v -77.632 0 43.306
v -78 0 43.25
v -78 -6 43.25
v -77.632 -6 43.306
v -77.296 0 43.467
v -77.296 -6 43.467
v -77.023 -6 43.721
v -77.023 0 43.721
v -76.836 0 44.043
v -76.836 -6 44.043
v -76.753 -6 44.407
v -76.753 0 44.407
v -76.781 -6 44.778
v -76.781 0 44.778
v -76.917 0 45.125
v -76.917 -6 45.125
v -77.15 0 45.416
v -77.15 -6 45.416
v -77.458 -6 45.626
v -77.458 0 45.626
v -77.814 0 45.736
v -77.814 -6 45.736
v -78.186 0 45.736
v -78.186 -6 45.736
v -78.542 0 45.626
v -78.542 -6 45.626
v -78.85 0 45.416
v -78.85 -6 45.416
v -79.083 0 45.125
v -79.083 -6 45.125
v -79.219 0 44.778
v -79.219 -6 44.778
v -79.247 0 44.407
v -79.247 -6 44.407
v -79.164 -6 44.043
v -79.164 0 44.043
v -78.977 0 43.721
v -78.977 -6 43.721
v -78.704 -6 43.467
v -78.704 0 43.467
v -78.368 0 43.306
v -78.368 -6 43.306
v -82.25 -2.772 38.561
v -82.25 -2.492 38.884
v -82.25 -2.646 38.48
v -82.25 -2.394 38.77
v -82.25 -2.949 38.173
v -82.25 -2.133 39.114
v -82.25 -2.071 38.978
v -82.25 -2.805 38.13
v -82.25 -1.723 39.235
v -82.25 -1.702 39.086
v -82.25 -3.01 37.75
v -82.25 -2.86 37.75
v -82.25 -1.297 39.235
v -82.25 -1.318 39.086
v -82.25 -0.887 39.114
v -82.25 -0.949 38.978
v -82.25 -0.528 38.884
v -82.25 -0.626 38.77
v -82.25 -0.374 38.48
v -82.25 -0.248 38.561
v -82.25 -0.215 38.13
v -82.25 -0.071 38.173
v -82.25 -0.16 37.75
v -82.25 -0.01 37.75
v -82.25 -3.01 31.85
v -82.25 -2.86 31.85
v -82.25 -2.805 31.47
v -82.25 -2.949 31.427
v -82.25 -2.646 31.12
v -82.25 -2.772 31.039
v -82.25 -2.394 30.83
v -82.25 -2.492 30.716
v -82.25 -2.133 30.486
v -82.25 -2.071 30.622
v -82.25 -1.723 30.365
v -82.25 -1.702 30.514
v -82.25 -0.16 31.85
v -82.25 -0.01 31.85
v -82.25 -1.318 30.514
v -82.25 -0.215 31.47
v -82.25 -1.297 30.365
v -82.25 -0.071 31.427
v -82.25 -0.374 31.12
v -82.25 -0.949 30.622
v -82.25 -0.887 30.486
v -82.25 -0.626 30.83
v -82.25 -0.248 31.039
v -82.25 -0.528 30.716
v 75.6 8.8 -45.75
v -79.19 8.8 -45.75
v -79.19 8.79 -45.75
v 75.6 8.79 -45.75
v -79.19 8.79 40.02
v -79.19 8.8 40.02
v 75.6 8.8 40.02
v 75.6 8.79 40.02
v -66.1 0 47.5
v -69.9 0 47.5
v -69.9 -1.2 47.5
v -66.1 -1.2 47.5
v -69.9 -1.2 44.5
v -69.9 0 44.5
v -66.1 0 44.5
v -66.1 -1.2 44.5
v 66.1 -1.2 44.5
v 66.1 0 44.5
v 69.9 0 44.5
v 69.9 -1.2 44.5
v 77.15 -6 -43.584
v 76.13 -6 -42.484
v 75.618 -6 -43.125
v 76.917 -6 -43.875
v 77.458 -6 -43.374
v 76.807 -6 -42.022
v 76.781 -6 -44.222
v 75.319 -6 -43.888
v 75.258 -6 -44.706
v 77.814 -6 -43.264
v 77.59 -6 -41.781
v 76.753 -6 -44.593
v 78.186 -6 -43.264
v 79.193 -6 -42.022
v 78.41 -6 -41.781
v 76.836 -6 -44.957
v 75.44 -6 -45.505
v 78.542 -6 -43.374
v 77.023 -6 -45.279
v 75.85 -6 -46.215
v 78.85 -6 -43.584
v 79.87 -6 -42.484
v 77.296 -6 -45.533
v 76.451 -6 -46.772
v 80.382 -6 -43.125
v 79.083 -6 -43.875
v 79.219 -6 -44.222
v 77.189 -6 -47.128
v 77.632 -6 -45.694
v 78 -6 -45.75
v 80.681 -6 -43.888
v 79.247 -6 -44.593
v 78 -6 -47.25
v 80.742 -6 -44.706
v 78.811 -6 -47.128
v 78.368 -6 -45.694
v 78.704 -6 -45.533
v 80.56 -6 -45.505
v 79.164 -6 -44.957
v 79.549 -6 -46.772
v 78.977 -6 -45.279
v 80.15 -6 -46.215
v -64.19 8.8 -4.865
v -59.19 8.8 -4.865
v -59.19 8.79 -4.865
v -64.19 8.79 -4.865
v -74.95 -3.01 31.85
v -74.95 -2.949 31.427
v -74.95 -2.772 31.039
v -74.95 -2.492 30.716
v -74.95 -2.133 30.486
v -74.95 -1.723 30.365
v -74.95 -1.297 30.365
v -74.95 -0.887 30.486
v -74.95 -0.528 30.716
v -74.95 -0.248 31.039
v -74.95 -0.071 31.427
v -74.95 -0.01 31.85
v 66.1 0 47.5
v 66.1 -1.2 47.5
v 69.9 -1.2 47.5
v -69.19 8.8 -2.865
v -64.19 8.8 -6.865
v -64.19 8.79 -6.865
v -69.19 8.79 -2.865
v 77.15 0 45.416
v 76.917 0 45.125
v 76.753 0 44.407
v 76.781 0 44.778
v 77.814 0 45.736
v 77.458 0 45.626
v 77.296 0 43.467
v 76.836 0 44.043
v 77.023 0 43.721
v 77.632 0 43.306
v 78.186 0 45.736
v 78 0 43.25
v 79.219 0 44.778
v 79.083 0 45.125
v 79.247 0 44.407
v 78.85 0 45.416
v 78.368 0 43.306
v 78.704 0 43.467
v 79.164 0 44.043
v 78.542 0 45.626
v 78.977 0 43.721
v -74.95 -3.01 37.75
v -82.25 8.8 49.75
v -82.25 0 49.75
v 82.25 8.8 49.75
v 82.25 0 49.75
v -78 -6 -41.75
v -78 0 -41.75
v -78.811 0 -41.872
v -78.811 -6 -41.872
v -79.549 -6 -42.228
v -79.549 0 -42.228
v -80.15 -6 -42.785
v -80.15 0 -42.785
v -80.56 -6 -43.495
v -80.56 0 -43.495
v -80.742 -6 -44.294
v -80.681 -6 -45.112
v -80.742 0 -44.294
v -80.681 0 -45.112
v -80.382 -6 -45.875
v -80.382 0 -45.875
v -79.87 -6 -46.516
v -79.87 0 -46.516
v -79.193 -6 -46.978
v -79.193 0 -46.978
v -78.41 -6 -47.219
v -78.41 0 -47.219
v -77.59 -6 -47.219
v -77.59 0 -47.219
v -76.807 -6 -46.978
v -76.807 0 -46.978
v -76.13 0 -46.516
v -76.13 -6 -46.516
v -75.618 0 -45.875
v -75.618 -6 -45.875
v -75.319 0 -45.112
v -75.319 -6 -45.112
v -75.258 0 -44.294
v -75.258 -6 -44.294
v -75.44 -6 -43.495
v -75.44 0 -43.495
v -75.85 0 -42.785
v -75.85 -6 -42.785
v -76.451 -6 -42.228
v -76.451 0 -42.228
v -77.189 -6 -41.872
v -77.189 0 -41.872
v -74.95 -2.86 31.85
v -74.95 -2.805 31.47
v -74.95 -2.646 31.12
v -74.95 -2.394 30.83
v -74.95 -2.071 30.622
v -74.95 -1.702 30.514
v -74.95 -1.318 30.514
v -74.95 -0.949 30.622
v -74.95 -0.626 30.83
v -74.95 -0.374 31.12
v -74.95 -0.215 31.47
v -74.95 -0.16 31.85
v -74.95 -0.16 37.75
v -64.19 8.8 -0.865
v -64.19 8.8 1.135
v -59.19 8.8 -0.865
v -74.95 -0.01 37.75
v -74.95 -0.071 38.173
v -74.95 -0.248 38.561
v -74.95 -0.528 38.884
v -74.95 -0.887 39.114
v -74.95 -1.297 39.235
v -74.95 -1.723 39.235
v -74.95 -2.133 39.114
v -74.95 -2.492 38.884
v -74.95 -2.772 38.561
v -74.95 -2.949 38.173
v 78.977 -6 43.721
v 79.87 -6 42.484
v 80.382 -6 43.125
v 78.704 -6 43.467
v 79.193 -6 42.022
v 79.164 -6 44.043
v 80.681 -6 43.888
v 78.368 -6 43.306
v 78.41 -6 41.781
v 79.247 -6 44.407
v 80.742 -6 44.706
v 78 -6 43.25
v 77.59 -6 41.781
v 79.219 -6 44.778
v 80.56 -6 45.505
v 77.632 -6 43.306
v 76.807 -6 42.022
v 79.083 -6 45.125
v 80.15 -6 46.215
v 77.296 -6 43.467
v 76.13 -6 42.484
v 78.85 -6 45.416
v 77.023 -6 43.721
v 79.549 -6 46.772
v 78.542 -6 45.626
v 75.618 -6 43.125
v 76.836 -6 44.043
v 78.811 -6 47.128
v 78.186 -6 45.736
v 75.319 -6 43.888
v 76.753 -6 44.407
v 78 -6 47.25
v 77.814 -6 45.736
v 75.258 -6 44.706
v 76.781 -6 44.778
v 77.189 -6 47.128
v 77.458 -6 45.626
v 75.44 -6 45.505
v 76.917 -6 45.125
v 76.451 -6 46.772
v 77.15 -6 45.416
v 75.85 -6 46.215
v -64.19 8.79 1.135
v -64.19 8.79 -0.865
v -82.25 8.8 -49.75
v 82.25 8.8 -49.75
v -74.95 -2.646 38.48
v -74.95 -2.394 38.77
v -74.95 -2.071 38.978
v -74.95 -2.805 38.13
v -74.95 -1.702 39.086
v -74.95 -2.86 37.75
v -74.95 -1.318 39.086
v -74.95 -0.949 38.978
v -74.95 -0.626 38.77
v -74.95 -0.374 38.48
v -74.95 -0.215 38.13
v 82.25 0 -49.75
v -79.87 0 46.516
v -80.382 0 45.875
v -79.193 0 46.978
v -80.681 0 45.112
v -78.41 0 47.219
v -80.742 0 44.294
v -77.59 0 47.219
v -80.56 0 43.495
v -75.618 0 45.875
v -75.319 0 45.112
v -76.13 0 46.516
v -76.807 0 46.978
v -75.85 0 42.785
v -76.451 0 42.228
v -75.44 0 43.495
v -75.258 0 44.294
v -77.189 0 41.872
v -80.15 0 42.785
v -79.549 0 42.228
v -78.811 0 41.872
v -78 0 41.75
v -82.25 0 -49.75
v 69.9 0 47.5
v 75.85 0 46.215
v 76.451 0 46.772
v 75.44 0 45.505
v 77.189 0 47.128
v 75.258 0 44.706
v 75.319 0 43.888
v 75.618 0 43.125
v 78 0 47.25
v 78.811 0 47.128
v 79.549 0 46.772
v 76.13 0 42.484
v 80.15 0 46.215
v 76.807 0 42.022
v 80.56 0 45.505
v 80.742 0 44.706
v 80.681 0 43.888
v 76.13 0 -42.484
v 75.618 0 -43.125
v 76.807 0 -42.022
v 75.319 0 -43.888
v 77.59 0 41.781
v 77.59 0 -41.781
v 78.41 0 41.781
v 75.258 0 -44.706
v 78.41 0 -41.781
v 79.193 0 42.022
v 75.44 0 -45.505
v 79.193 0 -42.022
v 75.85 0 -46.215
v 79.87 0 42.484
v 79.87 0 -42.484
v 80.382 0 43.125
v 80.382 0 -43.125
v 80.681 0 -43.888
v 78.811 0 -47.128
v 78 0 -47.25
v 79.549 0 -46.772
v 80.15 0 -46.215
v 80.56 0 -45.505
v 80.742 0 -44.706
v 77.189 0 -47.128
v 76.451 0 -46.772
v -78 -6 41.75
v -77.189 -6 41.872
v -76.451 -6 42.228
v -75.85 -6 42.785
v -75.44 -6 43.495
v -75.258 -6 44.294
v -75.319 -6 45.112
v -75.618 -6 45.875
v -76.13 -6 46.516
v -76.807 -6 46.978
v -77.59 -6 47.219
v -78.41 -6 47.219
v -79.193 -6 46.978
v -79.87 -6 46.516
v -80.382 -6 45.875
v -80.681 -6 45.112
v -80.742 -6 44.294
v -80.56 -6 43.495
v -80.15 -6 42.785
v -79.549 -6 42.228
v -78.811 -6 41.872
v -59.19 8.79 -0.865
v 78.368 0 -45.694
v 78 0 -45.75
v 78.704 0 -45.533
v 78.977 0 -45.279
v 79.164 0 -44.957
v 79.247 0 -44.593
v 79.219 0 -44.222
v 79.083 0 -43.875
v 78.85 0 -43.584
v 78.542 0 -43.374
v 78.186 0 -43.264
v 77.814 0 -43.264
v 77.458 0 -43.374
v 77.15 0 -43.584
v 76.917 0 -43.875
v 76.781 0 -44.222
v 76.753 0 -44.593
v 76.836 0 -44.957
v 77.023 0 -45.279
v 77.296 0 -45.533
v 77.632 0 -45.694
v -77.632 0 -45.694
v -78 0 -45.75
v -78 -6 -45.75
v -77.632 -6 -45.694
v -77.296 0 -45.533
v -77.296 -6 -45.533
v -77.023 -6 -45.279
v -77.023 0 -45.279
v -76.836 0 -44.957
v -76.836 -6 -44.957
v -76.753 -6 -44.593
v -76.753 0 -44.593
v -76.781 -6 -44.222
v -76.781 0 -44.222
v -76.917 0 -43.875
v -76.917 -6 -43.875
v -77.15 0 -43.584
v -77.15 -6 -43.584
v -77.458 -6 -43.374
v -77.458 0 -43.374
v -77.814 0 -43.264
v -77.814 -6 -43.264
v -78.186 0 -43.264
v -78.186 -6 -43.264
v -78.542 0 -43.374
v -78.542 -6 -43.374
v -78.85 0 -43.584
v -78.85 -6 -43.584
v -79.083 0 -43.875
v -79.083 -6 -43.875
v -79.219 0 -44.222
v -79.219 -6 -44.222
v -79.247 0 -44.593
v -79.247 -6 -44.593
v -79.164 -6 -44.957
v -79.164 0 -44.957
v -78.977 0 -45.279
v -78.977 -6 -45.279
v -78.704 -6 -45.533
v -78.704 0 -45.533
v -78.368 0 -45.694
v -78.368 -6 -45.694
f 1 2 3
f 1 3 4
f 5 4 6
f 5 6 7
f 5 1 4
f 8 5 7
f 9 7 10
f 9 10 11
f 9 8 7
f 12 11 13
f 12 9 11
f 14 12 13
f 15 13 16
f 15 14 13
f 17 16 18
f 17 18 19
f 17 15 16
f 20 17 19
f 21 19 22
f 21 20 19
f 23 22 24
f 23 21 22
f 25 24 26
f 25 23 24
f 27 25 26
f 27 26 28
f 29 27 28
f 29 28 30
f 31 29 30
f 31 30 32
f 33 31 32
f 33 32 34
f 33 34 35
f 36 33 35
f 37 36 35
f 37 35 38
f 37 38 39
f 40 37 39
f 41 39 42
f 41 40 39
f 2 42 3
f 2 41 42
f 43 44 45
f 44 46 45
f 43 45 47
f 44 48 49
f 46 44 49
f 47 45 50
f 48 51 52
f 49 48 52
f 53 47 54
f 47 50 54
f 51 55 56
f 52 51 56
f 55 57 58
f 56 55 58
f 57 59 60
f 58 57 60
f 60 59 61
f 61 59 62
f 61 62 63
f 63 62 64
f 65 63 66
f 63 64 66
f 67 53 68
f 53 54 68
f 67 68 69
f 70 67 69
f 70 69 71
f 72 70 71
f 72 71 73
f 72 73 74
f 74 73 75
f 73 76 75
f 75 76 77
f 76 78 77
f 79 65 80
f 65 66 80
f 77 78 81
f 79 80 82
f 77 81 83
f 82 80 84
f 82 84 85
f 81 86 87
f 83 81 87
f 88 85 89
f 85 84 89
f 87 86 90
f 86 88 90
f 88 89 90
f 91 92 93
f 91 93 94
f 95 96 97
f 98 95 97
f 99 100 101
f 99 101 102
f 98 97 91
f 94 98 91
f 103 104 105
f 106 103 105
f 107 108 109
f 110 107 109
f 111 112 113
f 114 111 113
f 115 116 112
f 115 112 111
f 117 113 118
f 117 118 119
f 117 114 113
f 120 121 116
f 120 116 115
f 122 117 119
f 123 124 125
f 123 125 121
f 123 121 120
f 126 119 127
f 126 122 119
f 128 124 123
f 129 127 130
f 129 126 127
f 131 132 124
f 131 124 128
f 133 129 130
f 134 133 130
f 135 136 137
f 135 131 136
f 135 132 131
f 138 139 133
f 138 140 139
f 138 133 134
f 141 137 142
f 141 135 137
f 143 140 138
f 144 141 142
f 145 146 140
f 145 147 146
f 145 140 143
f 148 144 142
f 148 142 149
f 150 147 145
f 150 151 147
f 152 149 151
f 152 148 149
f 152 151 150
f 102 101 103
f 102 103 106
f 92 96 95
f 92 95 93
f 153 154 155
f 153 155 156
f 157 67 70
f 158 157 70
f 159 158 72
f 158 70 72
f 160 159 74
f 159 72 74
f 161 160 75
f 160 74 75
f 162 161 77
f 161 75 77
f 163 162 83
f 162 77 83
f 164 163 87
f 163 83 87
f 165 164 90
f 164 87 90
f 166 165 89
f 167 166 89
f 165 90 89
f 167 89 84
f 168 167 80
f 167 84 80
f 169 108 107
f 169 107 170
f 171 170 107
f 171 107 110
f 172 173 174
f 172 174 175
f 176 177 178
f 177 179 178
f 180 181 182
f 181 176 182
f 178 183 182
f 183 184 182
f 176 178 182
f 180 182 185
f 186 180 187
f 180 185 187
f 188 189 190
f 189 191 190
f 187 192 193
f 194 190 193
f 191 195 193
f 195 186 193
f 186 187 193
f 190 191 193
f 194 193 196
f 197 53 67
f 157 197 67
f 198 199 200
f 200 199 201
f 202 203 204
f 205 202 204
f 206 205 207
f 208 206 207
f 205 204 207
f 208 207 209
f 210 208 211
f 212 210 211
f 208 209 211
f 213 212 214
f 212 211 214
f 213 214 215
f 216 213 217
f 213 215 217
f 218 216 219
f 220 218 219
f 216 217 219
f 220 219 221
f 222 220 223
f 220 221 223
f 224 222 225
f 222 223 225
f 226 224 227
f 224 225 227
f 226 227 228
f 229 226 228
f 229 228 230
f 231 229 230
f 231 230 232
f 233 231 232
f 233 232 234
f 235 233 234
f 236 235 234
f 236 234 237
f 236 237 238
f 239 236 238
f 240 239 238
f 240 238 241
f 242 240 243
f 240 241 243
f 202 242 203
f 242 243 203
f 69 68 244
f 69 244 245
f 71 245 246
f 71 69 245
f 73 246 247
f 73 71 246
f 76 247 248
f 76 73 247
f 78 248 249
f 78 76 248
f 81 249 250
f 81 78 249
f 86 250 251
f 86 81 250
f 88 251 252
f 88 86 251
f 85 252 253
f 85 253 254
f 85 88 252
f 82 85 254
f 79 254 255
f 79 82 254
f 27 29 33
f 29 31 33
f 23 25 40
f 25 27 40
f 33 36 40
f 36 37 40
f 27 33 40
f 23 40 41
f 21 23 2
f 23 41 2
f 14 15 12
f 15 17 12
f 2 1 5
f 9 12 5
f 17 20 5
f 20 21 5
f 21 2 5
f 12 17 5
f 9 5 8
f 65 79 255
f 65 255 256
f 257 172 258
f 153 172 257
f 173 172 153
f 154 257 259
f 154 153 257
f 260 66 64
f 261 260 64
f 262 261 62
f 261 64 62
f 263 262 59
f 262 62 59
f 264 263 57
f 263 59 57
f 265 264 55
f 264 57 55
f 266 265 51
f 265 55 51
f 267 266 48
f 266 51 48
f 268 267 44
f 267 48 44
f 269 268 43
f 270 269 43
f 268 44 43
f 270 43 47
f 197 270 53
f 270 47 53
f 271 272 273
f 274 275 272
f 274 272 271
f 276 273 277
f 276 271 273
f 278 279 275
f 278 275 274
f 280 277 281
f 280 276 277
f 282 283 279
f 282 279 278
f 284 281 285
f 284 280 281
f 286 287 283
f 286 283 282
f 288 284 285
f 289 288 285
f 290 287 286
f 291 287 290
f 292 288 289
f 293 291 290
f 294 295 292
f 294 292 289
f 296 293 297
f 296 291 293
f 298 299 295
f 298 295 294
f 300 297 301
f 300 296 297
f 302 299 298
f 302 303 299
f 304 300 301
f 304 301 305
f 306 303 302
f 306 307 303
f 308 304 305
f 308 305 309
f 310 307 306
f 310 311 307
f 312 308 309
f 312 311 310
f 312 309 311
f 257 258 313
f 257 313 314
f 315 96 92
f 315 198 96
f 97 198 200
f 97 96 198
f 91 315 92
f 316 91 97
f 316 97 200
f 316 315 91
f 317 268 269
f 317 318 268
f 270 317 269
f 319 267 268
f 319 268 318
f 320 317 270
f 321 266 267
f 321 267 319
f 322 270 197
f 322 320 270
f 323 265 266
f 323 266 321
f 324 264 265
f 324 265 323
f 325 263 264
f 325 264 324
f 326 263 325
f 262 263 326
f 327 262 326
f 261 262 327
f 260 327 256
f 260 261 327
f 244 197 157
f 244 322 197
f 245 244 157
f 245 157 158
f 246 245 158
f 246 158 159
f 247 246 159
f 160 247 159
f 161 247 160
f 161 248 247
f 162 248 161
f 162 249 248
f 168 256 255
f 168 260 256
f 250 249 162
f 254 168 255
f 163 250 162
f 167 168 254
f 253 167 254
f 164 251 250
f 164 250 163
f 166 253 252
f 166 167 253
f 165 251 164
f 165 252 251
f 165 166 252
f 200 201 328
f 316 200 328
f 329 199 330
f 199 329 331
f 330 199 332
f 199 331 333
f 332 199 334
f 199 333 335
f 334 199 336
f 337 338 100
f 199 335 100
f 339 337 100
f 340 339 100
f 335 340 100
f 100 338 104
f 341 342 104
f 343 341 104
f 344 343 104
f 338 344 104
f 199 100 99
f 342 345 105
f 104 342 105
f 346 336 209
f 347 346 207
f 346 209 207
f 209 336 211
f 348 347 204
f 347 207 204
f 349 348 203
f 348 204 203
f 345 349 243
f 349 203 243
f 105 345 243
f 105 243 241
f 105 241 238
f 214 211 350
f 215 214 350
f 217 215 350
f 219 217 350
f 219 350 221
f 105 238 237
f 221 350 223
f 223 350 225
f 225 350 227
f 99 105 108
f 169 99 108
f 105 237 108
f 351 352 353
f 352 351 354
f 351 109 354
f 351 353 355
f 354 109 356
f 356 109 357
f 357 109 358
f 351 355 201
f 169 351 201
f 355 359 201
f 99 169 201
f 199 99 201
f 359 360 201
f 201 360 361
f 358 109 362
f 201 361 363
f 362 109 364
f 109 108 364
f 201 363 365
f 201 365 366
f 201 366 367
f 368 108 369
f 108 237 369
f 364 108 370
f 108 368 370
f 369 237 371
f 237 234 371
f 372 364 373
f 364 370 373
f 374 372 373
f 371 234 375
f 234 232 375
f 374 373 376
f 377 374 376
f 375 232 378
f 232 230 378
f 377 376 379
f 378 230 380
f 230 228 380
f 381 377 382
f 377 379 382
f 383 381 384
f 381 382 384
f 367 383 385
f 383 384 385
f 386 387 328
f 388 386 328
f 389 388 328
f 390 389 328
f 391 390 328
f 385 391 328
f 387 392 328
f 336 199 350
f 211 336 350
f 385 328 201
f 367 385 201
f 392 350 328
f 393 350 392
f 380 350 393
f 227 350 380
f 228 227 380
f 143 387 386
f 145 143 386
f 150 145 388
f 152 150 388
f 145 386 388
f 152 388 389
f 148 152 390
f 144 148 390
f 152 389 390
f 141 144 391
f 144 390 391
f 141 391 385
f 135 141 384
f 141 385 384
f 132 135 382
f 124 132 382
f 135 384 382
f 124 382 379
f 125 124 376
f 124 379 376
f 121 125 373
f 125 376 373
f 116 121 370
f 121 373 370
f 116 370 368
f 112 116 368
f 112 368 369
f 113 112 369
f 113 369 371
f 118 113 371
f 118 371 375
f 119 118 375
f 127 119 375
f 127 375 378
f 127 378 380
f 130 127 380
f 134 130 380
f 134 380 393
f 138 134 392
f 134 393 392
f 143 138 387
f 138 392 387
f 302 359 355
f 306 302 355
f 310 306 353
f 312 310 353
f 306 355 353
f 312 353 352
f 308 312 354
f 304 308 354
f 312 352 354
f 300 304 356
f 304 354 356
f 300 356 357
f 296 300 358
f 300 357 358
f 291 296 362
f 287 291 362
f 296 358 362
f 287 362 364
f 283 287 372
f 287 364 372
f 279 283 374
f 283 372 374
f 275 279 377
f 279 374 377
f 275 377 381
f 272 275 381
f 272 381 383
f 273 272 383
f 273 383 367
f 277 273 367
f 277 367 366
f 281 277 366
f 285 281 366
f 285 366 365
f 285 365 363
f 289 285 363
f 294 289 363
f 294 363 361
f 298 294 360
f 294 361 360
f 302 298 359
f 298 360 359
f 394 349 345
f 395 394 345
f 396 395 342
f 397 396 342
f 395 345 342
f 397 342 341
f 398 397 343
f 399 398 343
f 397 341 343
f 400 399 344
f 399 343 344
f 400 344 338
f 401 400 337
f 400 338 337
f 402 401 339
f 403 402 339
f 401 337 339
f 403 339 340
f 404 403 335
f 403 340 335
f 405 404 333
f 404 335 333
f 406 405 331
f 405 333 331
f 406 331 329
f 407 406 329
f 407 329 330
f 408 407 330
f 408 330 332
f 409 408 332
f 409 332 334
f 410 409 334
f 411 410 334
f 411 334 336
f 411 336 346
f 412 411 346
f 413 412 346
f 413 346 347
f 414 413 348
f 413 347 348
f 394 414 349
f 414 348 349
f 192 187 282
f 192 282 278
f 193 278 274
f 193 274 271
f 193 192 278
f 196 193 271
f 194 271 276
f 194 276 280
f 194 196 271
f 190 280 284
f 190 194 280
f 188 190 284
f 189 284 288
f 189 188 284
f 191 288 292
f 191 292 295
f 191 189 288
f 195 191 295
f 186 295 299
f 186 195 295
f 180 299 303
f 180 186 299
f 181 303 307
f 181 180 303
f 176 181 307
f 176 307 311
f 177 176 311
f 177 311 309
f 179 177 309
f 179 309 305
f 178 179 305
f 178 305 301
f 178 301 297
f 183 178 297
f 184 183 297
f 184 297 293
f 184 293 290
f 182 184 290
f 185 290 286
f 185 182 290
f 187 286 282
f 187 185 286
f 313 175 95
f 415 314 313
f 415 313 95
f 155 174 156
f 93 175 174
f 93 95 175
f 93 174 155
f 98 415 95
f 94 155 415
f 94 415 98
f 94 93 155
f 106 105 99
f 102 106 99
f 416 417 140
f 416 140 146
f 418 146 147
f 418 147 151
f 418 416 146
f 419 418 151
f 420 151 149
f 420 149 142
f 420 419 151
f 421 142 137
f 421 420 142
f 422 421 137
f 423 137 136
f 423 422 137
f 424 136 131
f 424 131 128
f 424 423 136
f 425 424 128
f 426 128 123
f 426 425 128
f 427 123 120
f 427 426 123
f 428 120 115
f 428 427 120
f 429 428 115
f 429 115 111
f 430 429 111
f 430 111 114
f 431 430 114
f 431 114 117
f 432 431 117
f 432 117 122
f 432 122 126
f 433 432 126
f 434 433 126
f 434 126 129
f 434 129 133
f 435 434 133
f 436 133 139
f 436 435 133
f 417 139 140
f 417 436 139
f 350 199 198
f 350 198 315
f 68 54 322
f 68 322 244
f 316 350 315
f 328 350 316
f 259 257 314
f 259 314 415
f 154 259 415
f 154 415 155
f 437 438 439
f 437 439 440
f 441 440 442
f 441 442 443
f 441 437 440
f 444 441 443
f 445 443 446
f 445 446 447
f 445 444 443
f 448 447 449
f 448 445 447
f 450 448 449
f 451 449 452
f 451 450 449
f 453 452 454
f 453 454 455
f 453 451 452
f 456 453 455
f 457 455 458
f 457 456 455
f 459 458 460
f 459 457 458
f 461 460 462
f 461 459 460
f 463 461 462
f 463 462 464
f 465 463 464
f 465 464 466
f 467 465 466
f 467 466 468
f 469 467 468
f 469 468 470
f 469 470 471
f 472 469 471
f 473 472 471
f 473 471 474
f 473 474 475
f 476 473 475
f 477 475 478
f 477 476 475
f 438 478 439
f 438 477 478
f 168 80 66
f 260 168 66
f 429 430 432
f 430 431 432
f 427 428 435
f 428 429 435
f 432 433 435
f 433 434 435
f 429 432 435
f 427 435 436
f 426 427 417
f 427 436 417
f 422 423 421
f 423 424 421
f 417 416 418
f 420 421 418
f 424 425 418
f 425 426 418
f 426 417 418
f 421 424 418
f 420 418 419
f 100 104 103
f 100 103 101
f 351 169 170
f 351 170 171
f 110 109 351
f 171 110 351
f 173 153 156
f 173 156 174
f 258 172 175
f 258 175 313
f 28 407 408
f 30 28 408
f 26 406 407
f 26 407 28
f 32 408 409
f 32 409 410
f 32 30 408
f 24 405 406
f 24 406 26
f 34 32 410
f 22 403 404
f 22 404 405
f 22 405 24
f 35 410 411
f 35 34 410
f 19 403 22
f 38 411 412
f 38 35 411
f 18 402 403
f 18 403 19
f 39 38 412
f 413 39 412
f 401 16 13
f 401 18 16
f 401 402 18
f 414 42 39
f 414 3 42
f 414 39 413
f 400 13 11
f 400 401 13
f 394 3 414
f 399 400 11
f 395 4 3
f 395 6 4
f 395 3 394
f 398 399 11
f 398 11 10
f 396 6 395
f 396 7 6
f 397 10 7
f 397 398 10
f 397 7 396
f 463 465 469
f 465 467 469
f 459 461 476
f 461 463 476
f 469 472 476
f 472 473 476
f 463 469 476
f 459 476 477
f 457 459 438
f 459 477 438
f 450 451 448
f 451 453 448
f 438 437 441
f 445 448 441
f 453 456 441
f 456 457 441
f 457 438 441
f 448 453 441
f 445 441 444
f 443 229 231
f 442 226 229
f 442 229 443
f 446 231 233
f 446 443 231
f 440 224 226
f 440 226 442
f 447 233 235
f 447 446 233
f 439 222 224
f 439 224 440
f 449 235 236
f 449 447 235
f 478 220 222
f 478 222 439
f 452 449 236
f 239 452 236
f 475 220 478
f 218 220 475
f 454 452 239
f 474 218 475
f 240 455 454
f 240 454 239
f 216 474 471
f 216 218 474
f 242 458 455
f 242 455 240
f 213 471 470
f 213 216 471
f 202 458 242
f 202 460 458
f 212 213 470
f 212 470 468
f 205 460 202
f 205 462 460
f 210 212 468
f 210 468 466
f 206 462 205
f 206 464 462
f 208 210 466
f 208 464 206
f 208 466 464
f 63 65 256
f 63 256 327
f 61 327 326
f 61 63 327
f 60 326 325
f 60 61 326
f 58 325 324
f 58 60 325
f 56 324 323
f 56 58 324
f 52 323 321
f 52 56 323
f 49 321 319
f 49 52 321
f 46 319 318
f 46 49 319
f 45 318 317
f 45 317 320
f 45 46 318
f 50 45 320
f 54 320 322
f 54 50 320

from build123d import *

# Parameters (mm, degrees)
SKETCH1_W           = 164.5
SKETCH1_H           = 99.5
BOSS_EXTRUDE1_DEPTH = 8.8
SKETCH2_R           = 2.75
SKETCH2_R_2         = 1.25
BOSS_EXTRUDE2_DEPTH = 6
SKETCH3_W           = 154.79
SKETCH3_H           = 85.77
CUT_EXTRUDE1_DEPTH  = 0.01
BOSS_EXTRUDE3_DEPTH = 7.3
SKETCH5_W           = 3.8
SKETCH5_H           = 3
BOSS_EXTRUDE4_DEPTH = 1.2


with BuildPart() as part:
    # Sketch1 → Boss-Extrude1 (new body)
    with BuildSketch(Plane(origin=(0, 0, 0), x_dir=(1, 0, 0), z_dir=(0, 1, 0))):
        Rectangle(SKETCH1_W, SKETCH1_H)
    extrude(amount=BOSS_EXTRUDE1_DEPTH)

    # Sketch2 → Boss-Extrude2 (add)
    # profile 1 of 4: a face of its own
    with BuildSketch(Plane.XZ):
        with Locations(Location((-78, 44.5, 0), (0, 0, 270))):
            Circle(SKETCH2_R)
        with Locations(Location((-78, 44.5, 0), (0, 0, 270))):
            Circle(SKETCH2_R_2, mode=Mode.SUBTRACT)
    # profile 2 of 4: a face of its own
    with BuildSketch(Plane.XZ):
        with Locations(Location((78, 44.5, 0), (0, 0, 90))):
            Circle(SKETCH2_R)
        with Locations(Location((78, 44.5, 0), (0, 0, 270))):
            Circle(SKETCH2_R_2, mode=Mode.SUBTRACT)
    # profile 3 of 4: a face of its own
    with BuildSketch(Plane.XZ):
        with Locations(Location((78, -44.5, 0), (0, 0, 270))):
            Circle(SKETCH2_R)
        with Locations(Location((78, -44.5, 0), (0, 0, 270))):
            Circle(SKETCH2_R_2, mode=Mode.SUBTRACT)
    # profile 4 of 4: a face of its own
    with BuildSketch(Plane.XZ):
        with Locations(Location((-78, -44.5, 0), (0, 0, 90))):
            Circle(SKETCH2_R)
        with Locations(Location((-78, -44.5, 0), (0, 0, 270))):
            Circle(SKETCH2_R_2, mode=Mode.SUBTRACT)
    extrude(amount=BOSS_EXTRUDE2_DEPTH)

    # Sketch3 → Cut-Extrude1 (cut)
    with BuildSketch(Plane(origin=(0, 8.8, 0), x_dir=(1, 0, 0), z_dir=(0, 1, 0))):
        with Locations((-1.795, 2.865)):
            Rectangle(SKETCH3_W, SKETCH3_H)
        Polygon((-64.19, -1.135), (-64.19, 0.865), (-59.19, 0.865), (-59.19, 4.865), (-64.19, 4.865), (-64.19, 6.865), (-69.19, 2.865), align=None, mode=Mode.SUBTRACT)
    extrude(amount=-CUT_EXTRUDE1_DEPTH, mode=Mode.SUBTRACT)

    # Sketch5 → Boss-Extrude4 (add)
    with BuildSketch(Plane.XZ):
        with Locations((-68, 46)):
            Rectangle(SKETCH5_W, SKETCH5_H)
        with Locations((68, 46)):
            Rectangle(SKETCH5_W, SKETCH5_H)
    extrude(amount=BOSS_EXTRUDE4_DEPTH)


with BuildPart() as body_2:
    # Sketch4 → Boss-Extrude3 (new body)
    with BuildSketch(Plane.ZY.offset(82.25)):
        with BuildLine():
            Line((31.85, -0.01), (37.75, -0.01))
            ThreePointArc((37.75, -0.01), (39.25, -1.51), (37.75, -3.01))
            Line((37.75, -3.01), (31.85, -3.01))
            ThreePointArc((31.85, -3.01), (30.35, -1.51), (31.85, -0.01))
        make_face()
        with BuildLine():
            Line((31.85, -0.16), (37.75, -0.16))
            ThreePointArc((37.75, -0.16), (39.1, -1.51), (37.75, -2.86))
            Line((37.75, -2.86), (31.85, -2.86))
            ThreePointArc((31.85, -2.86), (30.5, -1.51), (31.85, -0.16))
        make_face(mode=Mode.SUBTRACT)
    extrude(amount=-BOSS_EXTRUDE3_DEPTH)


solid = Compound([part.part, body_2.part])
